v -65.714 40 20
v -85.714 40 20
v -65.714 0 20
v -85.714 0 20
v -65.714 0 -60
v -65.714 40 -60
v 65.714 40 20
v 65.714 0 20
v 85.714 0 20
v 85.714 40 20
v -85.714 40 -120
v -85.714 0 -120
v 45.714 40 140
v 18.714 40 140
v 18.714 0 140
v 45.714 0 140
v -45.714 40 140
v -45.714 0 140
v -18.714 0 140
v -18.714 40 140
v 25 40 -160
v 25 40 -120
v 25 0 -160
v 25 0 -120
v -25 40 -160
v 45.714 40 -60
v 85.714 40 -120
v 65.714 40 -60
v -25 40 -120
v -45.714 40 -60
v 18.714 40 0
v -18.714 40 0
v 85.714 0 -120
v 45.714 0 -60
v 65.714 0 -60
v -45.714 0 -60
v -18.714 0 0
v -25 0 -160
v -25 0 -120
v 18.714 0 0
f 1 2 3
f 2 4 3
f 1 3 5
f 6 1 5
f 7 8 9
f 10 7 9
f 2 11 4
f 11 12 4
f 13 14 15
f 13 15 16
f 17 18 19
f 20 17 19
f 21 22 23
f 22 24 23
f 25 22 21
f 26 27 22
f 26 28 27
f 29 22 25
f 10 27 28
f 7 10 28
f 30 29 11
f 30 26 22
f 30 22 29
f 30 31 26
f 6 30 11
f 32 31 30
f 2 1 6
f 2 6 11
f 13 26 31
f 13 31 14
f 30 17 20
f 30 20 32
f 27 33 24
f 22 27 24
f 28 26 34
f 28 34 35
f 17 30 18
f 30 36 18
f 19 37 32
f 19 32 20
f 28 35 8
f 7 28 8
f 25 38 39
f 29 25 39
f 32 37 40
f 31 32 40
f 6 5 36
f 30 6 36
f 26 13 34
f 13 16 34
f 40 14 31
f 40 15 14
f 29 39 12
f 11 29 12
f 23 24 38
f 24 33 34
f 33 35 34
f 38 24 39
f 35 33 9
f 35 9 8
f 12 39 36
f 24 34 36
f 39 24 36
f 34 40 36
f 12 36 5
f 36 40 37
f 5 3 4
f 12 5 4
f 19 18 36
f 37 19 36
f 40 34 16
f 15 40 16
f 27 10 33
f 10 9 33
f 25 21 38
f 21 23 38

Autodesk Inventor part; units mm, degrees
ref_plane "YZ Plane" through (0, 0, 0) normal (1, 0, 0) x (0, 1, 0)
ref_plane "XZ Plane" through (0, 0, 0) normal (0, 1, 0) x (-1, 0, 0)
ref_plane "XY Plane" through (0, 0, 0) normal (0, 0, 1) x (1, 0, 0)
sketch "スケッチ1" plane through (0, 0, 0) normal (0, 1, 0) x (-1, 0, 0)
  line L0 (45.7143, 140) -> (25.7143, 140)
  line L1 (25.7143, 140) -> (25.7143, 0)
  line L2 (25.7143, 0) -> (45.7143, 0)
  line L3 (45.7143, 0) -> (45.7143, 140)
  line L4 (45.7143, 0) -> (0, 0)
  line L5 (0, 0) -> (0, -120)
  line L6 (0, -120) -> (45.7143, -120)
  line L7 (45.7143, -120) -> (45.7143, 0)
  line L8 (25, -120) -> (0, -120)
  line L9 (0, -120) -> (0, -160)
  line L10 (0, -160) -> (25, -160)
  line L11 (25, -160) -> (25, -120)
  line L12 (45.7143, -120) -> (65.7143, -120)
  line L13 (65.7143, -120) -> (65.7143, -60)
  line L14 (65.7143, -60) -> (45.7143, -60)
  line L15 (45.7143, -60) -> (45.7143, -120)
  line L16 (65.7143, -120) -> (85.7143, -120)
  line L17 (85.7143, -120) -> (85.7143, 20)
  line L18 (85.7143, 20) -> (65.7143, 20)
  line L19 (65.7143, 20) -> (65.7143, -120)
  line L20 (0, -220) -> (0, 200) projected
  line L21 (102.8571, 0) -> (-17.1429, 0) projected
  line L22 (25.7143, 0) -> (25.7143, 140)
  line L23 (25.7143, 0) -> (18.7143, 0)
  line L24 (18.7143, 0) -> (18.7143, 140)
  line L25 (18.7143, 140) -> (25.7143, 140)
  line L26 (25.7143, 140) -> (25.7143, 0)
  point P0 (0, 0)
  point P1 (65.7143, 0)
  point P2 (25.7143, 0)
  point P3 (18.7143, 0)
  dimension "d0" = 40
  dimension "d2" = 300
  dimension "d3" = 140
  dimension "d4" = 85.7143
  dimension "d5" = 20
  dimension "d6" = 20
  dimension "d7" = 25
  dimension "d10" = 60
  dimension "d11" = 7
extrude "押し出し1" add sketch "スケッチ1" along normal blind 40 contours L3 L2 L1 L0 | L1 L4 L24 L25 | L7 L6 L5 L4 L2 | L14 L13 L12 L7 | L21 L17 L16 L13 L19 | L19 L18 L17 L21 | L11 L10 L9 L6
mirror "ミラー1" about plane through (0, 0, 0) normal (1, 0, 0)
properties part number "human_model"
